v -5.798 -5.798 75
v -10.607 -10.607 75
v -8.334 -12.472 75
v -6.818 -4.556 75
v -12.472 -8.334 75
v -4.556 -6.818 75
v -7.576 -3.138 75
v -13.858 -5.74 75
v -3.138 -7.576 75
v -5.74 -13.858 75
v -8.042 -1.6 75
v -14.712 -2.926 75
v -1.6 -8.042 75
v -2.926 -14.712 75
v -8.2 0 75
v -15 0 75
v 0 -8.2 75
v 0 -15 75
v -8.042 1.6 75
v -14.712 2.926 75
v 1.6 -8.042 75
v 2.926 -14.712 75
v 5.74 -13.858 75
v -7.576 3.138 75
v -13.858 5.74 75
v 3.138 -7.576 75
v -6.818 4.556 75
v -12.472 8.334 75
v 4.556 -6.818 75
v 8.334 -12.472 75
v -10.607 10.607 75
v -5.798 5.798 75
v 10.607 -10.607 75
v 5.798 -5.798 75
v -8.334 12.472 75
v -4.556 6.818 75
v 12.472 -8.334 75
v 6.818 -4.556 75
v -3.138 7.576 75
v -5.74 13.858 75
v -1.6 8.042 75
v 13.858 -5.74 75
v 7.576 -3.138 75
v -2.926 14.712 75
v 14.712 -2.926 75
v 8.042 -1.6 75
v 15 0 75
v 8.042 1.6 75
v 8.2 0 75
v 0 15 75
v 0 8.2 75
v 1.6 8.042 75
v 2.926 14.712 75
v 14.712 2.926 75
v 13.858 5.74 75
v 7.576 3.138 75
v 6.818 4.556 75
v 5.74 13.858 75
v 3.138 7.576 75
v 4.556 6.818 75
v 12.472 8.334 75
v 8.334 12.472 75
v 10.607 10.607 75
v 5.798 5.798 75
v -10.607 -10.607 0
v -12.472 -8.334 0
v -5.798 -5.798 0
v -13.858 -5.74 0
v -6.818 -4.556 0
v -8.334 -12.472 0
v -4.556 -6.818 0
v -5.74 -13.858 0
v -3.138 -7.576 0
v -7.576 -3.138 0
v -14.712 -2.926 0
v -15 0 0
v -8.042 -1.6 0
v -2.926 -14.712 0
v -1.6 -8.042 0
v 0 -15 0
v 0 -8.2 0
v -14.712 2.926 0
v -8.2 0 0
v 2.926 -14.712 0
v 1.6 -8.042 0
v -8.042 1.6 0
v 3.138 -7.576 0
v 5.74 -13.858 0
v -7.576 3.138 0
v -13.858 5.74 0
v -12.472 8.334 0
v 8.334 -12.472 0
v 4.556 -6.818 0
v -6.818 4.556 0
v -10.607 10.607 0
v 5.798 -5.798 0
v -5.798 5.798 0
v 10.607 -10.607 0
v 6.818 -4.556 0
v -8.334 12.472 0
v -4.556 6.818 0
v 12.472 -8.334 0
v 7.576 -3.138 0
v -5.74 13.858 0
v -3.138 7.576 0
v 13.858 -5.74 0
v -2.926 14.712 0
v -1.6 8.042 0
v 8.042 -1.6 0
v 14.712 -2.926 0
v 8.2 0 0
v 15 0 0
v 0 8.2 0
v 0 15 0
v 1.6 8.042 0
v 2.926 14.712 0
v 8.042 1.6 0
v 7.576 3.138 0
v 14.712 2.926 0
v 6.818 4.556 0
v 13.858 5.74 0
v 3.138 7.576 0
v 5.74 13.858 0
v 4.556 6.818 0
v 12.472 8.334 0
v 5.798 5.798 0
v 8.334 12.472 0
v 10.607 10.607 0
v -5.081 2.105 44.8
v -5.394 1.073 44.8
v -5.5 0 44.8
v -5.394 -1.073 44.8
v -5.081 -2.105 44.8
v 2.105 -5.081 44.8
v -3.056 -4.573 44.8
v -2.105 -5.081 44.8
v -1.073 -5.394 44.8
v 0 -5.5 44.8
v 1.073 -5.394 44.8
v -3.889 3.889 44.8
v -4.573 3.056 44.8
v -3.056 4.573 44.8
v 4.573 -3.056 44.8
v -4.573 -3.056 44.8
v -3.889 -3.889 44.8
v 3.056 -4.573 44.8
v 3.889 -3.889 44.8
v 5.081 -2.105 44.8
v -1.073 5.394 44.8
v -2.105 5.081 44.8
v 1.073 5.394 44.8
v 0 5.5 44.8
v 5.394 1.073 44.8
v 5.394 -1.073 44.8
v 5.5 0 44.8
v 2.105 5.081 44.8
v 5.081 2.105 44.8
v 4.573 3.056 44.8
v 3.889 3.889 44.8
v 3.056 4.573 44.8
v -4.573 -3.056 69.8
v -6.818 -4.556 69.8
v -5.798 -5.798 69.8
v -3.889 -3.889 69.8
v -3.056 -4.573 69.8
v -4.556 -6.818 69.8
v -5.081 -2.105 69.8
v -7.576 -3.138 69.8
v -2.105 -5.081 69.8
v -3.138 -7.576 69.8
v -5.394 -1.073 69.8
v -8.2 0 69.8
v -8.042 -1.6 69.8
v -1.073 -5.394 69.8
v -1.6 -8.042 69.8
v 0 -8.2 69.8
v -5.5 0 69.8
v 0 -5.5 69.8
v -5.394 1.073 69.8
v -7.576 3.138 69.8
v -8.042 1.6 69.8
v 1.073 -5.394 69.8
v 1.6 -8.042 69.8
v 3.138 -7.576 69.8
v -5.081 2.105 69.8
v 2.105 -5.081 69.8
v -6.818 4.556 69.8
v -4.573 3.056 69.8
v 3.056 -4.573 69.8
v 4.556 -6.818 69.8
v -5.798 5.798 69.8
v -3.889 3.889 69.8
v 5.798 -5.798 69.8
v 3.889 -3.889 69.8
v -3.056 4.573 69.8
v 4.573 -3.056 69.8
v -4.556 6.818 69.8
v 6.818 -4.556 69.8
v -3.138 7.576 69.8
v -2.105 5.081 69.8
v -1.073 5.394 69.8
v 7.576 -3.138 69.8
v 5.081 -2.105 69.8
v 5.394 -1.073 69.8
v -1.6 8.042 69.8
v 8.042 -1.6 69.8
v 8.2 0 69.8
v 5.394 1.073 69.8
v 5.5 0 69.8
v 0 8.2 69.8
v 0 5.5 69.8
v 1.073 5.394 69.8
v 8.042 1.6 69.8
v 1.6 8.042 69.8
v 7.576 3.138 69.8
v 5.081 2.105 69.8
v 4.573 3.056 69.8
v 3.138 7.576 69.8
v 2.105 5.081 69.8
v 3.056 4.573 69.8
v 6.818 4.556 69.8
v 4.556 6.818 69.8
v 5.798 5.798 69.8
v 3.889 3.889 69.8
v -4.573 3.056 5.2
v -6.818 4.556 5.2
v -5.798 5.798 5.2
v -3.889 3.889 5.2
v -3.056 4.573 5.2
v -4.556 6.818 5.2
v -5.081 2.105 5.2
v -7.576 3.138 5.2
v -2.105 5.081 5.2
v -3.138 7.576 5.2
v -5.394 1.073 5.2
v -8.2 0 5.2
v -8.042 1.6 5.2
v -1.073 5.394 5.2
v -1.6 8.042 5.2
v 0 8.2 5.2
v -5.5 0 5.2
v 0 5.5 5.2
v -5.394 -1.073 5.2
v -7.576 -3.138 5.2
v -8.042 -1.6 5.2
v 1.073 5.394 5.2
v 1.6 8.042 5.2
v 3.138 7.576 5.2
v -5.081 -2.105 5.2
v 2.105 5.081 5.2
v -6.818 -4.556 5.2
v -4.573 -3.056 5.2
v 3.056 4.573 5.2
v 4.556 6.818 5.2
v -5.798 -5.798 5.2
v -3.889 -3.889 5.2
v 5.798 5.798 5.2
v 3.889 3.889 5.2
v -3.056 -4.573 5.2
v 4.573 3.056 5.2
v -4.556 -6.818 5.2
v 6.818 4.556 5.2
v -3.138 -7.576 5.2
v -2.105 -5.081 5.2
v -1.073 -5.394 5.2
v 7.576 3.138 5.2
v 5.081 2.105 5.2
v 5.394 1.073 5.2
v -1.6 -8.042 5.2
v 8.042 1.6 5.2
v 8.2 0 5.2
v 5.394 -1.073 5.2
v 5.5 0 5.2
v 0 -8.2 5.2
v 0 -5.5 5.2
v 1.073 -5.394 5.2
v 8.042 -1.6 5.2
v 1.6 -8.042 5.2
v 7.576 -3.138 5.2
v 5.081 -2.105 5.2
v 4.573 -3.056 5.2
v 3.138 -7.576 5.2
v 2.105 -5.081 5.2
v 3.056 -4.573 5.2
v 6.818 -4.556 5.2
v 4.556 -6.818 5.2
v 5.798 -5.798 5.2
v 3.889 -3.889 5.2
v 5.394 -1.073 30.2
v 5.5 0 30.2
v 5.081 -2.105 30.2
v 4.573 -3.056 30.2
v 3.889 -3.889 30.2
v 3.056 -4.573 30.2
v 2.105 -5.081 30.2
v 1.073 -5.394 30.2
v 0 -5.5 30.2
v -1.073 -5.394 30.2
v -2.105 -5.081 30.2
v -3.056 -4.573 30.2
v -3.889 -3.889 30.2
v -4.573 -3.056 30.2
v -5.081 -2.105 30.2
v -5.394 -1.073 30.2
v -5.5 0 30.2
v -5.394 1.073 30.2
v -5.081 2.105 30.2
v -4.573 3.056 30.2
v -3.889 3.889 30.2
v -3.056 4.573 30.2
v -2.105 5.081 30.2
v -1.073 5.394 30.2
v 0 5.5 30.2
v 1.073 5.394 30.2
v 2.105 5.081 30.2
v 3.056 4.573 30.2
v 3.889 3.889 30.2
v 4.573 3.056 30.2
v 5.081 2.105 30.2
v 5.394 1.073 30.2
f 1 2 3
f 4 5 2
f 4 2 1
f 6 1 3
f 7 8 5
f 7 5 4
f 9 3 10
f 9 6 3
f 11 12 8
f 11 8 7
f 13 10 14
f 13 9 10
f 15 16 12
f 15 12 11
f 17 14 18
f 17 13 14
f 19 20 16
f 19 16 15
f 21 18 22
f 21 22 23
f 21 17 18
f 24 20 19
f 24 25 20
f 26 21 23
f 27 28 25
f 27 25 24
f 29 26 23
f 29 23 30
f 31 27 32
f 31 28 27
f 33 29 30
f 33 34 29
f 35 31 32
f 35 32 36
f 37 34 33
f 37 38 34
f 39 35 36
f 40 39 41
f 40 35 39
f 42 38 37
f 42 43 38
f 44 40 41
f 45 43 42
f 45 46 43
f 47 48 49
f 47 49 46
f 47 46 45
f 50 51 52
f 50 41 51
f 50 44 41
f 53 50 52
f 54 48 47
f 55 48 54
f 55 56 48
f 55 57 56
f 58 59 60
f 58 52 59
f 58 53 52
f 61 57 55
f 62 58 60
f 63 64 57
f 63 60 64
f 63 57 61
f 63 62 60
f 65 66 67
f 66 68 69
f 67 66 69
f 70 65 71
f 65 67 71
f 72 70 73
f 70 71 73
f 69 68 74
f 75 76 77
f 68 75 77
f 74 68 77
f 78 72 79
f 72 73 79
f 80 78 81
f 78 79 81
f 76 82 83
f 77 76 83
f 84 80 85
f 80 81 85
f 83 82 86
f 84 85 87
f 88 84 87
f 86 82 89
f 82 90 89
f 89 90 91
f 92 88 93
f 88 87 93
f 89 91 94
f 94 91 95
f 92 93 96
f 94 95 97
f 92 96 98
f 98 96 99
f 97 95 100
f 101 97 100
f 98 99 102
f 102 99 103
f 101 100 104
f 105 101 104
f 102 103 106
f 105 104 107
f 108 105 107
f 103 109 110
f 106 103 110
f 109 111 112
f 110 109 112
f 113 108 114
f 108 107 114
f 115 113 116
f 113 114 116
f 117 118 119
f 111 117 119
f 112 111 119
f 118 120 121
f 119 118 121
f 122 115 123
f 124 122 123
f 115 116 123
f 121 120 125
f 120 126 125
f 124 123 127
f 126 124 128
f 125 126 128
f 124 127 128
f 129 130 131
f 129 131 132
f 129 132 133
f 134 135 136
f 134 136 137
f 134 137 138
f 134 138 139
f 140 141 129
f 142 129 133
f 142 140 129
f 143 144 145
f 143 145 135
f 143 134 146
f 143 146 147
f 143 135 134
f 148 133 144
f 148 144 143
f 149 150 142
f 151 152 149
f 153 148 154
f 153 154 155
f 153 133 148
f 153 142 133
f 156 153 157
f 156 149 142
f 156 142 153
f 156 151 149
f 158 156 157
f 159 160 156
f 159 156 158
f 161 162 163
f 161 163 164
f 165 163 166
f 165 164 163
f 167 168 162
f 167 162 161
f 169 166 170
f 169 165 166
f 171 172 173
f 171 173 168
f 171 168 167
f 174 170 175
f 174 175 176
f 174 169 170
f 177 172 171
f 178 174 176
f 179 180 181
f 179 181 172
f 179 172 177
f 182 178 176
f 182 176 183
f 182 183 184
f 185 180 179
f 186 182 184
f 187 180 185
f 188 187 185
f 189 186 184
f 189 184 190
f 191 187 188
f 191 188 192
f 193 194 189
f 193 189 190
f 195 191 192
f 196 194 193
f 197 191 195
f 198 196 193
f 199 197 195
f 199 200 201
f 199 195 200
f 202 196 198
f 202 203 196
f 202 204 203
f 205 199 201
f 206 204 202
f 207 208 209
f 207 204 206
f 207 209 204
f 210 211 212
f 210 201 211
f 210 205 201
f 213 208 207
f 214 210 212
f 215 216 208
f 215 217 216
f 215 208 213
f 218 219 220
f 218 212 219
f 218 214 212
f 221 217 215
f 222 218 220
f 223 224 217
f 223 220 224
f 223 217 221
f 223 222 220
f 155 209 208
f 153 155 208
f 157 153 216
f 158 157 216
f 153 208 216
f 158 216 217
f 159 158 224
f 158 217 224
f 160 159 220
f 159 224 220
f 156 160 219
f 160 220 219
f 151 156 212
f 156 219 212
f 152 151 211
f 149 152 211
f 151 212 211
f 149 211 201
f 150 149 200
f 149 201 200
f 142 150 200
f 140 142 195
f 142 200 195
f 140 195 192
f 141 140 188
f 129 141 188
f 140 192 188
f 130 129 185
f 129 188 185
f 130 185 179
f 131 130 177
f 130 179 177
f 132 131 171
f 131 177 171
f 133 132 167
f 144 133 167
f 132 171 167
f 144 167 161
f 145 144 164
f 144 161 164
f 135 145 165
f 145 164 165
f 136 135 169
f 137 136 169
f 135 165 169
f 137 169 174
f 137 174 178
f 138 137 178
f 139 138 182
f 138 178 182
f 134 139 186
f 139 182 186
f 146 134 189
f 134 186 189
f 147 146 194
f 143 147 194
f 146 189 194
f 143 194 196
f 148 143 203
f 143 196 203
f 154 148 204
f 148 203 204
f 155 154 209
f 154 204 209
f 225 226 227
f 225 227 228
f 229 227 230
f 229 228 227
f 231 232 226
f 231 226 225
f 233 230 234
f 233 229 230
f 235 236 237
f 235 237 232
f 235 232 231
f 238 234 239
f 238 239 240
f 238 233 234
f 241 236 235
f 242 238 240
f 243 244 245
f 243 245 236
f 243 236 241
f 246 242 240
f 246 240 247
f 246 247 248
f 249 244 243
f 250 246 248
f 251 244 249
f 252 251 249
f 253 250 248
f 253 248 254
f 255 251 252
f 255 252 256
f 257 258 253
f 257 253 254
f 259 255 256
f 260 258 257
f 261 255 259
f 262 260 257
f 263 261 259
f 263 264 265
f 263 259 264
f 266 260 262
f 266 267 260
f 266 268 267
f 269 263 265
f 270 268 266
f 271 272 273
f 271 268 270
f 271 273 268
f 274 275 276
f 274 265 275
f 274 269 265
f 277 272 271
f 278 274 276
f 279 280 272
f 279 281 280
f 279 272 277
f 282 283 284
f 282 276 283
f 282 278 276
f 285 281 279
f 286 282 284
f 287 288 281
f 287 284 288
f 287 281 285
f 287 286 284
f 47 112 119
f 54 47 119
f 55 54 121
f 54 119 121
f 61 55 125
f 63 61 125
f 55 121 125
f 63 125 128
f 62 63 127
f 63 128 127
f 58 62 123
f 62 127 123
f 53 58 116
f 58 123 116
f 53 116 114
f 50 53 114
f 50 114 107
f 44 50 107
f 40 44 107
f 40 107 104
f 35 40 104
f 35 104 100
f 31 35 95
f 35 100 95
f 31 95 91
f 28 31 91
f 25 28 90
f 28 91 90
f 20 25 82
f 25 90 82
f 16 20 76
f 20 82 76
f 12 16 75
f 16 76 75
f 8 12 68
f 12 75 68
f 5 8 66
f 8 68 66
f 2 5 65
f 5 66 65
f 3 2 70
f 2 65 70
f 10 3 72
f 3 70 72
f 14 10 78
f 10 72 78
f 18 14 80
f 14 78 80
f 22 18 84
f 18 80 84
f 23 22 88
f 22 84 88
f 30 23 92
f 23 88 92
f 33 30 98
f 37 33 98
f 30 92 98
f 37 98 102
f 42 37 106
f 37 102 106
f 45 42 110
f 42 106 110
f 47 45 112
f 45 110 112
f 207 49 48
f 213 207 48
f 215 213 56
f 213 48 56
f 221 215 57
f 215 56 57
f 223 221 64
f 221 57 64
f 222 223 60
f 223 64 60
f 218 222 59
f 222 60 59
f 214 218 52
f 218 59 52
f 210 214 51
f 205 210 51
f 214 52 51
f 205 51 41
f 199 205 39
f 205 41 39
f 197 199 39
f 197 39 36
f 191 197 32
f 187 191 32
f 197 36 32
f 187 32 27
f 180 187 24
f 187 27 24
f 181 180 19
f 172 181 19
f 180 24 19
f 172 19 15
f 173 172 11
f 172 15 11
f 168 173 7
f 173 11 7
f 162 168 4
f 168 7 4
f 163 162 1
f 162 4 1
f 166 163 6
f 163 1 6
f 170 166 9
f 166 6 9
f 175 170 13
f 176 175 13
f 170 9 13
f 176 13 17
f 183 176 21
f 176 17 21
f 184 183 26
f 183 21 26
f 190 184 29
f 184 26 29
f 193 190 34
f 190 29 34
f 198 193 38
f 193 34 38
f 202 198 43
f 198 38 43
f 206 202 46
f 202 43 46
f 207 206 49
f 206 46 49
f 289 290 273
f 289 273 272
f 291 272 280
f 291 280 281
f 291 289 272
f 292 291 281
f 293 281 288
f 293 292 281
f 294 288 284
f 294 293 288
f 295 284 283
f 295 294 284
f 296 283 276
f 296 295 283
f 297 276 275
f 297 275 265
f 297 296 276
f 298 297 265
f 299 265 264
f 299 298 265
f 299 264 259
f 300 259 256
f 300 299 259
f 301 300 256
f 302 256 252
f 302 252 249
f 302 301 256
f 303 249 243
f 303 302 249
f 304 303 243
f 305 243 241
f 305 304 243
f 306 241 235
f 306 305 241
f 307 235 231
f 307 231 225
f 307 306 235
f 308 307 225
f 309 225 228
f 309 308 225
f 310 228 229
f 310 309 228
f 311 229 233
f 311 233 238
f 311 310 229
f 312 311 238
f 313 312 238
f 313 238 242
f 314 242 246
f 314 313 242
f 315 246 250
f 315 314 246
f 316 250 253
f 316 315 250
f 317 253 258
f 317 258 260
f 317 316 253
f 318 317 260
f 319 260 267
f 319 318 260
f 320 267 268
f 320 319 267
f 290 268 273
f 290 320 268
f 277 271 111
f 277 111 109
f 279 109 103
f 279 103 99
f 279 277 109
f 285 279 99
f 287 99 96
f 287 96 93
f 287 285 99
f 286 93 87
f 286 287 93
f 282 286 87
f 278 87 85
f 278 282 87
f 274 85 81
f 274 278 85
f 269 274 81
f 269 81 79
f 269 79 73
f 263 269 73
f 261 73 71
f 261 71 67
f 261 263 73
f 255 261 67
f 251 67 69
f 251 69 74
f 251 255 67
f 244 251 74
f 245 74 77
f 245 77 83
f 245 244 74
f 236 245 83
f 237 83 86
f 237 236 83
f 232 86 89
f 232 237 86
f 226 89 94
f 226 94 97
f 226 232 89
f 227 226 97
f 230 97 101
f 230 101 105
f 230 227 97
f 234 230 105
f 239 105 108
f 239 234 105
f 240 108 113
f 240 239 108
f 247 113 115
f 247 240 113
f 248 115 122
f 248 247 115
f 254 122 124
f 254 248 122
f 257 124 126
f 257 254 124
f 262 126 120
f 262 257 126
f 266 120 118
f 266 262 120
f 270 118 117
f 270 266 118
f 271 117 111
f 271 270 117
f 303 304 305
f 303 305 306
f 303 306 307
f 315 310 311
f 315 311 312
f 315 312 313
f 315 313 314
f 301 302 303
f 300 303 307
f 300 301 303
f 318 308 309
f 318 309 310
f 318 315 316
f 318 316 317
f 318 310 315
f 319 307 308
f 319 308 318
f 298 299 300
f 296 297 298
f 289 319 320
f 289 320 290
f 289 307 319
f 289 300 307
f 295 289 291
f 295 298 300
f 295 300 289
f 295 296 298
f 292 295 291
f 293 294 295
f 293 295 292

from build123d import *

# Parameters (mm, degrees)
SKETCH1_R           = 15
BOSS_EXTRUDE1_DEPTH = 75
SKETCH2_R           = 8.2
CUT_EXTRUDE1_DEPTH  = 5.2
CUT_EXTRUDE2_START  = -5.2
SKETCH3_R           = 8.2
CUT_EXTRUDE2_DEPTH  = 5.2
SKETCH4_R           = 5.5
CUT_EXTRUDE3_DEPTH  = 25
CUT_EXTRUDE4_START  = -25
SKETCH5_R           = 5.5
CUT_EXTRUDE4_DEPTH  = 25


with BuildPart() as part:
    # Sketch1 → Boss-Extrude1 (new body)
    with BuildSketch(Plane.XY):
        Circle(SKETCH1_R)
    extrude(amount=BOSS_EXTRUDE1_DEPTH)

    # Sketch2 → Cut-Extrude1 (cut)
    with BuildSketch(Plane.XY.offset(75)):
        Circle(SKETCH2_R)
    extrude(amount=-CUT_EXTRUDE1_DEPTH, mode=Mode.SUBTRACT)

    # Sketch3 → Cut-Extrude2 (cut)
    with BuildSketch(Plane(origin=(0, 0, 0), x_dir=(-1, 0, 0), z_dir=(0, 0, -1)).offset(CUT_EXTRUDE2_START)):
        with Locations(Location((0, 0, 0), (0, 0, 180))):
            Circle(SKETCH3_R)
    extrude(amount=CUT_EXTRUDE2_DEPTH, mode=Mode.SUBTRACT)

    # Sketch4 → Cut-Extrude3 (cut)
    with BuildSketch(Plane.XY.offset(69.8)):
        Circle(SKETCH4_R)
    extrude(amount=-CUT_EXTRUDE3_DEPTH, mode=Mode.SUBTRACT)

    # Sketch5 → Cut-Extrude4 (cut)
    with BuildSketch(Plane(origin=(0, 0, 5.2), x_dir=(-1, 0, 0), z_dir=(0, 0, -1)).offset(CUT_EXTRUDE4_START)):
        with Locations(Location((0, 0, 0), (0, 0, 180))):
            Circle(SKETCH5_R)
    extrude(amount=CUT_EXTRUDE4_DEPTH, mode=Mode.SUBTRACT)


solid = part.part
